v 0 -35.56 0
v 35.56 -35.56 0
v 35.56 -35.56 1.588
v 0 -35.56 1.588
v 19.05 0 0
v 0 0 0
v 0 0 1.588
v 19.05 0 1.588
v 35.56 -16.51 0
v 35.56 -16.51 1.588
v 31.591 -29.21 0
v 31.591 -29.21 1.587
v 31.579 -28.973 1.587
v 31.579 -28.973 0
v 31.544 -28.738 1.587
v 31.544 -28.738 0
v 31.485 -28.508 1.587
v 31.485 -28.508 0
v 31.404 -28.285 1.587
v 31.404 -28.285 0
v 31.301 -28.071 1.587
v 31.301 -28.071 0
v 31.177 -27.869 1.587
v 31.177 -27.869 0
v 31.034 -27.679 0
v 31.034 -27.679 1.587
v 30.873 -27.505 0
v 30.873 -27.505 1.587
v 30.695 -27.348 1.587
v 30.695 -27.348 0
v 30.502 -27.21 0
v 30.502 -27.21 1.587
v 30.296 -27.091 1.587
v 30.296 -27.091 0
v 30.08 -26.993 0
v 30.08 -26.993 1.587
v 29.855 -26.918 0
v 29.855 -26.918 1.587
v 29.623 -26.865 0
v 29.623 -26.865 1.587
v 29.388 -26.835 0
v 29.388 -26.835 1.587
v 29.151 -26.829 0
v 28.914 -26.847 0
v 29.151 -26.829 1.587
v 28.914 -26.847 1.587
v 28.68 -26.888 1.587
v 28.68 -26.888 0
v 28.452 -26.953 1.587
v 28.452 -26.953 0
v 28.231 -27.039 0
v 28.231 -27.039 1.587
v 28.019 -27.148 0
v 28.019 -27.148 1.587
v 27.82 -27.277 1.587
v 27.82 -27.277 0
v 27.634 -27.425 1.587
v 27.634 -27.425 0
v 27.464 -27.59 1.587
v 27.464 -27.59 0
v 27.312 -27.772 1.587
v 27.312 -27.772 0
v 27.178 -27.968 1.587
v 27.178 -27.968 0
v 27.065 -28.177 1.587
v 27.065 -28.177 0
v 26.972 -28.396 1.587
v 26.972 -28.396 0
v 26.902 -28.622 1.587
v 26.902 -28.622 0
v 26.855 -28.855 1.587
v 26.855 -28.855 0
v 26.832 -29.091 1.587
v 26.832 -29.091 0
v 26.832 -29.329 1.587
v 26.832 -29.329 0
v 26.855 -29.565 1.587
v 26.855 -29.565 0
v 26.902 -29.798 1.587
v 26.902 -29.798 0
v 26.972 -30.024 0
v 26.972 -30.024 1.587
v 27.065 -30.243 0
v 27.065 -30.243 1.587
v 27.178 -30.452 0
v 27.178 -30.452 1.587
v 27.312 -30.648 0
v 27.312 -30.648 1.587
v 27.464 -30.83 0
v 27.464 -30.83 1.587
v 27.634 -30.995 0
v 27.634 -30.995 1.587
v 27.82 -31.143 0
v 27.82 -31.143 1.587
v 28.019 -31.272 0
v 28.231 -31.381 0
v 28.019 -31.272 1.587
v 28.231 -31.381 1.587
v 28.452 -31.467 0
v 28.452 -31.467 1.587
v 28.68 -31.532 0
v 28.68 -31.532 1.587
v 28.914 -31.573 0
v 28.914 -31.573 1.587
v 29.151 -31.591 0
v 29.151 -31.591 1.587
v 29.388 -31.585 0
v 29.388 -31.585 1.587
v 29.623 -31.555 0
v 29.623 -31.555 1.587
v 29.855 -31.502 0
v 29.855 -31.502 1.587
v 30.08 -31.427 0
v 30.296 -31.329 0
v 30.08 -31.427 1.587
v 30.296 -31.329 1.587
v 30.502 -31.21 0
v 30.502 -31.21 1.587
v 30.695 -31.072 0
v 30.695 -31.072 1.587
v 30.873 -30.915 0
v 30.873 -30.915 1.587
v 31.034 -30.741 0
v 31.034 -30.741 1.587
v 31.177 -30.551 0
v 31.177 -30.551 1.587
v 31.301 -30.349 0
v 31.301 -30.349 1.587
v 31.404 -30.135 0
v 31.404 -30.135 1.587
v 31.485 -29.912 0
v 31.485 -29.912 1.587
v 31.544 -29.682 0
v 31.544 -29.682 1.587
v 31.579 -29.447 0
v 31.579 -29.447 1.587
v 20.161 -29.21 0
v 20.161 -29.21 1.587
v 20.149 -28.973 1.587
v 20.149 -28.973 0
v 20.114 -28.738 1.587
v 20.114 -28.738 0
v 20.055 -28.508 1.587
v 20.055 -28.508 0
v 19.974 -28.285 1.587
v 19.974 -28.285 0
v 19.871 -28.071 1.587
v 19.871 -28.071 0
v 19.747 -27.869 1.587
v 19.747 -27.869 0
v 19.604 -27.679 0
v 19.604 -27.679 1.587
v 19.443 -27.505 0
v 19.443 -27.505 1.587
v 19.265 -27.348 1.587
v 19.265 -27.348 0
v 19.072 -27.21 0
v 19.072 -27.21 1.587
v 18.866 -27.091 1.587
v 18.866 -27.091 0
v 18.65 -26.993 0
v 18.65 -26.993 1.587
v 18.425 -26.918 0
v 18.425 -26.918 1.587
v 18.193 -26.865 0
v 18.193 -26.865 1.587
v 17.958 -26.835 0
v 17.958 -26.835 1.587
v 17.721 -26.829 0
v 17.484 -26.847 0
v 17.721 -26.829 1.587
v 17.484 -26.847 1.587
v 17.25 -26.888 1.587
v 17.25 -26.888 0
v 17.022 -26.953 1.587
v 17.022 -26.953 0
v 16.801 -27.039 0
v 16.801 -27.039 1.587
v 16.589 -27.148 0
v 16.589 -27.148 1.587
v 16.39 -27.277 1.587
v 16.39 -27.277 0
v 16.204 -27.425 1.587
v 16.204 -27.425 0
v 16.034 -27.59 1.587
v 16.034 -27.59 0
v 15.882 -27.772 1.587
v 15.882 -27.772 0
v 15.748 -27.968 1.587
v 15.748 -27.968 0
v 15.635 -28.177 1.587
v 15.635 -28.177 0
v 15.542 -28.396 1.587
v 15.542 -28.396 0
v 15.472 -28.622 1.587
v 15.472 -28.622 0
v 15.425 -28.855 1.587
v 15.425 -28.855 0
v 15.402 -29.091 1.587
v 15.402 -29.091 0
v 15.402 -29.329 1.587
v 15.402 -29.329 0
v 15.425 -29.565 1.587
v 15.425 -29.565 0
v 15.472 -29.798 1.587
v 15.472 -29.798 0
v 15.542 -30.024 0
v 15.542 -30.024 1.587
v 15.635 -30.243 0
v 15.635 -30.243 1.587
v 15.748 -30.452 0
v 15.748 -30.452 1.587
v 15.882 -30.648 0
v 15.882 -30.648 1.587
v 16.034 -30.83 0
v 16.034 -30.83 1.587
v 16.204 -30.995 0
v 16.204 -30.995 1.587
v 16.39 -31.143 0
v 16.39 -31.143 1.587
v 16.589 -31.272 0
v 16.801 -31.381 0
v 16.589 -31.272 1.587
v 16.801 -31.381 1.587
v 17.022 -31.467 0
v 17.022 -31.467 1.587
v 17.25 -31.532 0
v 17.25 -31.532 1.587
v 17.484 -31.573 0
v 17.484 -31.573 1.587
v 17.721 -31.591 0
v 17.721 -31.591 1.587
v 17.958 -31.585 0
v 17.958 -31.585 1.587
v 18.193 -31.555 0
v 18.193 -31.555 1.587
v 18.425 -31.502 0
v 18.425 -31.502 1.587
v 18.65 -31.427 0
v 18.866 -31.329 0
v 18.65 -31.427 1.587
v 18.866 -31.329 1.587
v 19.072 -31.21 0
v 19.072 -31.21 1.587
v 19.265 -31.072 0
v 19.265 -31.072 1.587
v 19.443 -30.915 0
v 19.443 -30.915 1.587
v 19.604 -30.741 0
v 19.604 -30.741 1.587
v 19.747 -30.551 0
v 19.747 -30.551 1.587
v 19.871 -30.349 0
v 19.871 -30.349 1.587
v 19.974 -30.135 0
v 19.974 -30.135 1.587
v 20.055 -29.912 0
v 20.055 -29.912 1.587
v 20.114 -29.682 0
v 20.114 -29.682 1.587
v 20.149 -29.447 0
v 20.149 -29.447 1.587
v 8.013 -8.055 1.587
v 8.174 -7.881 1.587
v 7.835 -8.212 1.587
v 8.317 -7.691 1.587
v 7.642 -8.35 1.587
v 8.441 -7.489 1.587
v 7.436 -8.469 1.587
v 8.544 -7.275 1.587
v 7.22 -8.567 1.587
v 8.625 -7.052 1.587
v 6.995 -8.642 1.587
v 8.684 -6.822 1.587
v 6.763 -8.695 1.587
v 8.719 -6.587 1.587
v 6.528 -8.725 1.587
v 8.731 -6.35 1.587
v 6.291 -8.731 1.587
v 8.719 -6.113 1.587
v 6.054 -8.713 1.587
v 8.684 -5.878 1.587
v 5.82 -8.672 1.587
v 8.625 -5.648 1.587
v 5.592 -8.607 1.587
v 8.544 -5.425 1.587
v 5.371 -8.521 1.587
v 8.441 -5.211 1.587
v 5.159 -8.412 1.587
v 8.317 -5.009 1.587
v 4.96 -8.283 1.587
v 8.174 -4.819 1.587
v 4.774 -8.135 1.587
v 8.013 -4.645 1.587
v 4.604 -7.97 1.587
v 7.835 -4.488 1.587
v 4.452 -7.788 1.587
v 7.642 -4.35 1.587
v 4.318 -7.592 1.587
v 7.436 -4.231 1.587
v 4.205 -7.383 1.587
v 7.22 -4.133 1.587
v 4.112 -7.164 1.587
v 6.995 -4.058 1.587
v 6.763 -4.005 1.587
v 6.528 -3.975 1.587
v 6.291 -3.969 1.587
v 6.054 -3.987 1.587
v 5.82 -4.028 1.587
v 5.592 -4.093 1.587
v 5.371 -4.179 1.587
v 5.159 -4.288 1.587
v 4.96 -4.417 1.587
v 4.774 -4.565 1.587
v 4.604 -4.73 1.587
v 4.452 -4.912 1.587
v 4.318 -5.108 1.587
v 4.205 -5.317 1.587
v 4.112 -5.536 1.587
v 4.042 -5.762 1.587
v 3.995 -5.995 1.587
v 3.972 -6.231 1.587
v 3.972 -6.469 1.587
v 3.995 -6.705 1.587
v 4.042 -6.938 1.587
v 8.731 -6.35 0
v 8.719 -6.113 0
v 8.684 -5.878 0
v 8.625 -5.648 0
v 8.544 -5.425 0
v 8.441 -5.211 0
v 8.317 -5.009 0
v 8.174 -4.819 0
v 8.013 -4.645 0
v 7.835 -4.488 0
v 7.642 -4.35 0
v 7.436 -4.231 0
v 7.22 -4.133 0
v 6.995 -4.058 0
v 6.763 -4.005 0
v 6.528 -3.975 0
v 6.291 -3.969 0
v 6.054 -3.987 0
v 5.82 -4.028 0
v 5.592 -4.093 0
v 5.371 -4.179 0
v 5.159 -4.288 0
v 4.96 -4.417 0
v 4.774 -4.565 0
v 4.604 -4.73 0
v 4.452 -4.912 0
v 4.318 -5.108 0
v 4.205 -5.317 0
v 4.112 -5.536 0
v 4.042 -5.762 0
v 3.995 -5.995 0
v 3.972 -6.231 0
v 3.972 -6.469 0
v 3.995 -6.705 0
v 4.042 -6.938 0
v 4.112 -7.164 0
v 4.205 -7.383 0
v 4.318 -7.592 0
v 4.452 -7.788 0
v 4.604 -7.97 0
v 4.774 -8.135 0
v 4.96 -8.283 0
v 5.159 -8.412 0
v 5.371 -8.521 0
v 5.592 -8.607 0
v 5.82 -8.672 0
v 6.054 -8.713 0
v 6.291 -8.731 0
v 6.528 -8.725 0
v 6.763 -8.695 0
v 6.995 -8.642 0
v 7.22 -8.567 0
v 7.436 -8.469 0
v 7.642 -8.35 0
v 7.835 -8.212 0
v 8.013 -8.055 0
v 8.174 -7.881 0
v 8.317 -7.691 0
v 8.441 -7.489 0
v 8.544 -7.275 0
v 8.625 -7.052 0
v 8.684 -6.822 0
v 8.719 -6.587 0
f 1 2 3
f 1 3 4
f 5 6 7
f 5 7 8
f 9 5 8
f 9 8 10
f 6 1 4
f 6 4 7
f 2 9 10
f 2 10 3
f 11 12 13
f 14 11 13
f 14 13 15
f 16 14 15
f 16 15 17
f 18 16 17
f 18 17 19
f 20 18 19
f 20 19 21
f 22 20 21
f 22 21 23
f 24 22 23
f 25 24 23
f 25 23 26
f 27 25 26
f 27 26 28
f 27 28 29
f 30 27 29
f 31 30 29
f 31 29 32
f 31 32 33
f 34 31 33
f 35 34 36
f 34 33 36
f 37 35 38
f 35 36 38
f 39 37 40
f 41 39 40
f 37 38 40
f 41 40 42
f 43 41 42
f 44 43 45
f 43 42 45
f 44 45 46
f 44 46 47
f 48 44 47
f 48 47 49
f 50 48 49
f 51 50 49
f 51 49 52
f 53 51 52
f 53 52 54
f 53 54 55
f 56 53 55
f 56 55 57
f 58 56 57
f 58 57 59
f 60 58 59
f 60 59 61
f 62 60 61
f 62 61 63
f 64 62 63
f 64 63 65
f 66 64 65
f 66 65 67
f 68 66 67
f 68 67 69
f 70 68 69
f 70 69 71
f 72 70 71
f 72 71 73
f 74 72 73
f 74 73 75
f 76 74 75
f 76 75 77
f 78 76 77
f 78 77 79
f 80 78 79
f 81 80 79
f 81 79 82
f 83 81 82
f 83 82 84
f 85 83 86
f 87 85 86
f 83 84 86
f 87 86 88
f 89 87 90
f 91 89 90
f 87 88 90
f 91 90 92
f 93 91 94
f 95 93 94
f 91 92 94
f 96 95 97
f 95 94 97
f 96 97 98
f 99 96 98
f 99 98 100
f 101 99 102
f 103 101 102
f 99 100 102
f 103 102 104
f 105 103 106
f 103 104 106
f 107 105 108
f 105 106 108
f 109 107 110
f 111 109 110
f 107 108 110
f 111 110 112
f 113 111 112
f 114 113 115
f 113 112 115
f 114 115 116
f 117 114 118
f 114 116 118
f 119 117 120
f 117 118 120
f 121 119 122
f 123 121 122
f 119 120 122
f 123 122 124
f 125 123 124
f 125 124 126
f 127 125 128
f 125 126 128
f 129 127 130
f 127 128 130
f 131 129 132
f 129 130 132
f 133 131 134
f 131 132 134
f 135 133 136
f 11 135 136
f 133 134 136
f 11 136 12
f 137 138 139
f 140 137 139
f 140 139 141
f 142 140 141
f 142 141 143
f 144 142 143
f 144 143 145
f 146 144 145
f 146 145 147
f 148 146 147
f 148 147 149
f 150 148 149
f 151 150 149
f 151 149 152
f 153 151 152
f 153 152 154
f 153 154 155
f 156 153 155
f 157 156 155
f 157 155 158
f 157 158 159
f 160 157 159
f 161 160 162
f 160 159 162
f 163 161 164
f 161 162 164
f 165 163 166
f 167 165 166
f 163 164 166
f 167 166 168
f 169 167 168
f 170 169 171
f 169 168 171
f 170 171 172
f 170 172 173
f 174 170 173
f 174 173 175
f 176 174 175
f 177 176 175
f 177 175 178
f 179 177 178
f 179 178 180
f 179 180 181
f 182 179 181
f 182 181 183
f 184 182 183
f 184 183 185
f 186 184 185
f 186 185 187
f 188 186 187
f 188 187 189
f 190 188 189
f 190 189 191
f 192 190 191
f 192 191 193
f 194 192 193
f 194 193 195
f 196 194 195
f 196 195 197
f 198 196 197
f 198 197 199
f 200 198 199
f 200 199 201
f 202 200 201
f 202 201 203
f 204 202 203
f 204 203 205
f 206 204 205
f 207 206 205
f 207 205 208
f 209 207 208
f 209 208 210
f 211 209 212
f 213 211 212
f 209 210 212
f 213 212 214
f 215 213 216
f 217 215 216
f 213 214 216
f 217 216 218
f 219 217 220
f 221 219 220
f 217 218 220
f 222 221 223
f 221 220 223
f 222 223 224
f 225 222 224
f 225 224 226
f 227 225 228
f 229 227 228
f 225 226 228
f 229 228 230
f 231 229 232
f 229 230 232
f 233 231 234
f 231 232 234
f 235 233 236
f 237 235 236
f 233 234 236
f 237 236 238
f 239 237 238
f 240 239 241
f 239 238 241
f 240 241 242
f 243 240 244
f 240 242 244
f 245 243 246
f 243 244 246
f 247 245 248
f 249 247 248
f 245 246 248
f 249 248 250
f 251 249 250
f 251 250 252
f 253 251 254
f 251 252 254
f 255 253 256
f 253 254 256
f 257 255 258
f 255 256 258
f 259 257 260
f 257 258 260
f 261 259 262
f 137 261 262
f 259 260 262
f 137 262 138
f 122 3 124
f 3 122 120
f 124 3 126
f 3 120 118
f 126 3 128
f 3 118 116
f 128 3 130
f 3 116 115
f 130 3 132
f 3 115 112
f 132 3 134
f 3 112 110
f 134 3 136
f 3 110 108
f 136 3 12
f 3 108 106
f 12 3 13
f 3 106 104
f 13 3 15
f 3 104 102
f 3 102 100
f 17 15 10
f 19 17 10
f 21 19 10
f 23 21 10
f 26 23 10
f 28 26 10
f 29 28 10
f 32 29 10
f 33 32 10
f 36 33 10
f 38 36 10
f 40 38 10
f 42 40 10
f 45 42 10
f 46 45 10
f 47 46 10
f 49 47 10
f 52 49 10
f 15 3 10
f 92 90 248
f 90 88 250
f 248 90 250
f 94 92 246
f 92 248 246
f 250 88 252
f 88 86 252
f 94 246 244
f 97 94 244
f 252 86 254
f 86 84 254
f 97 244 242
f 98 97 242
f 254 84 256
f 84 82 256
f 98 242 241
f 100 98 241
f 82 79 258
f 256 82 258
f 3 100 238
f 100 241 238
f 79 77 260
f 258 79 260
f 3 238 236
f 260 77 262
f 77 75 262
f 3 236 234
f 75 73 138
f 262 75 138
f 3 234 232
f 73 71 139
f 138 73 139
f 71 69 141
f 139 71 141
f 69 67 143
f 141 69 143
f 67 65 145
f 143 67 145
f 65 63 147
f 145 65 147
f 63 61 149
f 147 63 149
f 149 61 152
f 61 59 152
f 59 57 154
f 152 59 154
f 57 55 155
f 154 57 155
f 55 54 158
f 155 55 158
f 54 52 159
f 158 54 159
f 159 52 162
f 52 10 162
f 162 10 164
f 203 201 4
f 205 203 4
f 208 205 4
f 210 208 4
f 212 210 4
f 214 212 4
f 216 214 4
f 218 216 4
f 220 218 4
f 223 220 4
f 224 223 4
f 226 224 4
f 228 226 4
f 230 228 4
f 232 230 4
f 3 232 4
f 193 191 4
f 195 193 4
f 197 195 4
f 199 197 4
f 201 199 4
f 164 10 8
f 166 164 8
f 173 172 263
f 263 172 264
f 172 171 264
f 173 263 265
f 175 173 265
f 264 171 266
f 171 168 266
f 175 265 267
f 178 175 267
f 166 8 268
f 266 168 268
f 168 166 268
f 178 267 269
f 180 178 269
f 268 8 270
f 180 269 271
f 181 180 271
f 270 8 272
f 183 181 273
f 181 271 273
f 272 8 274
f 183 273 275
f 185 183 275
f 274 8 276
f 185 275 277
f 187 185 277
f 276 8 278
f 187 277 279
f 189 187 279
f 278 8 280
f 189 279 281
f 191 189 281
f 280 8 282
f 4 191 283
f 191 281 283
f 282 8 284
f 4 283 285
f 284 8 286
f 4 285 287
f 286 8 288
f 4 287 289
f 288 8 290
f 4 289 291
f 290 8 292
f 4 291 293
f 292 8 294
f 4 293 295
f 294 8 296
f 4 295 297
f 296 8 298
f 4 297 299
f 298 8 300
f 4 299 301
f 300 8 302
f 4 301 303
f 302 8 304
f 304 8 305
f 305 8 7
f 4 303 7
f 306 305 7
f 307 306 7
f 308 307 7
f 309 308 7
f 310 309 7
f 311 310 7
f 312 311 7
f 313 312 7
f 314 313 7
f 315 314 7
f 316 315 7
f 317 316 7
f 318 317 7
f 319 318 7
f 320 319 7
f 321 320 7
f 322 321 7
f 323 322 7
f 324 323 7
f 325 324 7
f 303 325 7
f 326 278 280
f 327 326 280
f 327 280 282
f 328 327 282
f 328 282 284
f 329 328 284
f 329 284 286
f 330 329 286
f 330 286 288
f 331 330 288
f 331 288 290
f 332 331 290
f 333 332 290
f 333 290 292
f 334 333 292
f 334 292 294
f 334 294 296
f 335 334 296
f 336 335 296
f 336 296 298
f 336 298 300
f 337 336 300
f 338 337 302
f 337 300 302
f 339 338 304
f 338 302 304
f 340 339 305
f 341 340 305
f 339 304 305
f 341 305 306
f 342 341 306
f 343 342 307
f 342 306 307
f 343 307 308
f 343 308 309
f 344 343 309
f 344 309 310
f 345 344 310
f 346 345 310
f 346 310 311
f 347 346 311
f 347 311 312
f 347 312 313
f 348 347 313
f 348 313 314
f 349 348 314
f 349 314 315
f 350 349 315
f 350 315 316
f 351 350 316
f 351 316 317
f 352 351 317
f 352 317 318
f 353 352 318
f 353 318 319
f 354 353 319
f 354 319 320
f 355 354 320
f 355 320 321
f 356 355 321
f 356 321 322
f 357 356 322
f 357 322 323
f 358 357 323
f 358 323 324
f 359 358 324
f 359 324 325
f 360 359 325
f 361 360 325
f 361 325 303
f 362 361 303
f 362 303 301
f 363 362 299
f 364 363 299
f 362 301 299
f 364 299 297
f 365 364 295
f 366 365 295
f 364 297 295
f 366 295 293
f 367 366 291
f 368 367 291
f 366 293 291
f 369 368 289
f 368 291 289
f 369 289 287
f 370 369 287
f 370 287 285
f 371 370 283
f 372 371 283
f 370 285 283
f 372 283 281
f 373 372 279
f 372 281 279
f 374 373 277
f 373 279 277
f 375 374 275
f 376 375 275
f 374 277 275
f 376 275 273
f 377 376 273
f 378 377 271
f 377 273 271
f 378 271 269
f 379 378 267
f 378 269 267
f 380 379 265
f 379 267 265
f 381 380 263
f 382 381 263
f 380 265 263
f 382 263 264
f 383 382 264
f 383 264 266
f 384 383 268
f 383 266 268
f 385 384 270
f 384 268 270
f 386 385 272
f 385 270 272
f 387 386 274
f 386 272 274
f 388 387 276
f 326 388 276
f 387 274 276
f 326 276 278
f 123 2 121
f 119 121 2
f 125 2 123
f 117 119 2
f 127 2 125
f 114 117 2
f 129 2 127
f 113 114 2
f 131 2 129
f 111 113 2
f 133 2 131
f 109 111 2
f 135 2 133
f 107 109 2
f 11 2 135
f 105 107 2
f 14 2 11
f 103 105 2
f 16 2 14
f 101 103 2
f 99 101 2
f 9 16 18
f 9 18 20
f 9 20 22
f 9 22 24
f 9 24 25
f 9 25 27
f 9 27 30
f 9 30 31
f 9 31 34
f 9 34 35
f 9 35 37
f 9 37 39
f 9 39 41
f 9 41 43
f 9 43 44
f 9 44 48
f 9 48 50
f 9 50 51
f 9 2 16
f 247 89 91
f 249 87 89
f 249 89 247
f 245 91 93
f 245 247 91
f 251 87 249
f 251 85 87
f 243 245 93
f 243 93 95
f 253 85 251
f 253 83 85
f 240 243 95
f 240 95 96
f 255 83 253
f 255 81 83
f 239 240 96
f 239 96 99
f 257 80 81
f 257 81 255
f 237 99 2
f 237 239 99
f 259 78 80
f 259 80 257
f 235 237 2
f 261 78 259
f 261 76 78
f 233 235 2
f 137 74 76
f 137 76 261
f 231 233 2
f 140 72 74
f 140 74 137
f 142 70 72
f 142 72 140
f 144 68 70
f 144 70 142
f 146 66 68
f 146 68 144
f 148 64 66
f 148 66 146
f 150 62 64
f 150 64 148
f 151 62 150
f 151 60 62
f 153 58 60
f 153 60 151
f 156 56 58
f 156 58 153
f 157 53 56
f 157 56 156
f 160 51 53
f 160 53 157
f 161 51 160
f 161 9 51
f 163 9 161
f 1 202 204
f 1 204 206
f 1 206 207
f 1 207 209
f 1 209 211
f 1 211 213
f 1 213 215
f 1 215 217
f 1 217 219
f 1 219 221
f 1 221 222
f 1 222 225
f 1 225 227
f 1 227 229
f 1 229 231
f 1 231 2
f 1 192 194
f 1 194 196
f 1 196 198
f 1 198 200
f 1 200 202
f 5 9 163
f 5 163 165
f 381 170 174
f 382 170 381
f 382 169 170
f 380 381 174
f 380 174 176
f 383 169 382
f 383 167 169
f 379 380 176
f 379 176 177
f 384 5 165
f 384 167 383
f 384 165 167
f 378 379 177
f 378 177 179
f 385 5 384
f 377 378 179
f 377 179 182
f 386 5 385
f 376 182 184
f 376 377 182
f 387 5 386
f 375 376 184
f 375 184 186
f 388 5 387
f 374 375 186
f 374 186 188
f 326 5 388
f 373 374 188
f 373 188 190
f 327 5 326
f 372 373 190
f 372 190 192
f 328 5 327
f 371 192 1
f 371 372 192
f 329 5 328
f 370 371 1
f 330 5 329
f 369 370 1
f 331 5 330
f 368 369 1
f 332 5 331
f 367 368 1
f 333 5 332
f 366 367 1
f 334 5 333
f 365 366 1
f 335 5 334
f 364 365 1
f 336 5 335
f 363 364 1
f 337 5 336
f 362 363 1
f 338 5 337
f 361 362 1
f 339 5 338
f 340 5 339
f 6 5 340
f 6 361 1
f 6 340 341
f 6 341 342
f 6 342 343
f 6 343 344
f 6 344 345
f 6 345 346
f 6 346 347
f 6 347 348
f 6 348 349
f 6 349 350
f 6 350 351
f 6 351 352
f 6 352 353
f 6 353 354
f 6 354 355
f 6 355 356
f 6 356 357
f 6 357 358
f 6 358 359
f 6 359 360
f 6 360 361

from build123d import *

# Parameters (mm, degrees)
BOSS_EXTRUDE1_DEPTH            = 1.5875
F_3_16_0_1875_DIAMETER_HOLE1_D = 4.7625


with BuildPart() as part:
    # Sketch1 → Boss-Extrude1 (new body)
    with BuildSketch(Plane.XY):
        Polygon((19.05, 0), (35.56, -16.51), (35.56, -35.56), (0, -35.56), (0, 0), align=None)
    extrude(amount=BOSS_EXTRUDE1_DEPTH)

    # 3/16 (0.1875) Diameter Hole1 (through all)
    with Locations(Plane(origin=(0, 0, 0), x_dir=(-1, 0, 0), z_dir=(0, 0, -1))):
        with Locations((-6.35, -6.35), (-17.78, -29.21), (-29.21, -29.21)):
            Hole(F_3_16_0_1875_DIAMETER_HOLE1_D / 2)


solid = part.part
